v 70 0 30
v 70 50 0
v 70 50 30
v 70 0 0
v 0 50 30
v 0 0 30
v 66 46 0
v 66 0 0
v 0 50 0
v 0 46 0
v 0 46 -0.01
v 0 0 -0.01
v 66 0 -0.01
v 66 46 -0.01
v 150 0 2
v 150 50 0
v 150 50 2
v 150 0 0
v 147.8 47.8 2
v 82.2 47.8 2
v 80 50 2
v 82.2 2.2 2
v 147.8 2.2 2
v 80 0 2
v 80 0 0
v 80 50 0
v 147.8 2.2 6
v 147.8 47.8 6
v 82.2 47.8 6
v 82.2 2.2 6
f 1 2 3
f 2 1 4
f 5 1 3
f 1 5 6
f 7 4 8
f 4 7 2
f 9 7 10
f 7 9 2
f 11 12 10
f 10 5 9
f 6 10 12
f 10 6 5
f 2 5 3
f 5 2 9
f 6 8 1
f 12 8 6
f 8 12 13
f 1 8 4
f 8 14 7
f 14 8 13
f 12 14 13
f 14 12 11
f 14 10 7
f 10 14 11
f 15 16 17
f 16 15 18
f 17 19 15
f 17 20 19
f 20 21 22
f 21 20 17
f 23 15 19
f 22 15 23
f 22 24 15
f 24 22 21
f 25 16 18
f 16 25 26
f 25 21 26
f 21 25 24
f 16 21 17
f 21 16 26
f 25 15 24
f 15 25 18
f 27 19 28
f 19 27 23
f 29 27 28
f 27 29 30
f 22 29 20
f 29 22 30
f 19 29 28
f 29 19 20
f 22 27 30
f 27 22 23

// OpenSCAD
// --- Dimensions ---
// Box outer dimensions
BOX_W = 70;
BOX_D = 50;
BOX_H = 30;

// Box wall and floor thickness
WALL_THK = 2;
FLOOR_THK = 2;

// Lid plate dimensions (matches box outer footprint)
LID_W = 70;
LID_D = 50;
LID_PLATE_THK = 2;

// Lid lip dimensions (inner sliding part)
LIP_OUT_W = 65.6;
LIP_OUT_D = 45.6;
LIP_THK = 1.5;
LIP_H = 4;

// Spacing between parts
GAP = 10;

// --- Calculated Positions ---
// Box is centred at origin in X/Y
BOX_X = 0;
BOX_Y = 0;

// Lid is on the +X side, with GAP distance between them
// Box right edge is at BOX_W/2. Lid left edge is at BOX_W/2 + GAP.
// Lid centre X = (BOX_W/2 + GAP) + LID_W/2
LID_X = (BOX_W / 2) + GAP + (LID_W / 2);
LID_Y = 0; // Centred in Y

// --- Helper: Box Body ---
// Built on XY plane, builds up in +Z
module build_box() {
    $fn = 64;
    
    // 1. Main outer shell
    // Height includes floor and walls. 
    // We build a solid block of size BOX_W x BOX_D x BOX_H
    // Then subtract the inner cavity.
    union() {
        // Outer shell
        cube([BOX_W, BOX_D, BOX_H], center = false);
        
        // Inner cavity subtraction
        // Cavity starts at floor height (FLOOR_THK)
        // Cavity width/depth is reduced by 2 * WALL_THK
        // Cavity height is BOX_H - FLOOR_THK (open top)
        // We extend the cut slightly past the bottom face (z=0) to ensure clean boolean
        translate([0, 0, -0.01]) {
            cube([
                BOX_W - 2 * WALL_THK,
                BOX_D - 2 * WALL_THK,
                BOX_H - FLOOR_THK + 0.02 // Extend slightly into floor to cut cleanly
            ], center = false);
        }
    }
}

// --- Helper: Lid Body ---
// Printed upside down: Plate lies on bed (z=0), Lip builds up from there.
// The lip is the part that slides into the box.
module build_lid() {
    $fn = 64;
    
    union() {
        // 1. The base plate
        // Lies on the bed, thickness LID_PLATE_THK
        cube([LID_W, LID_D, LID_PLATE_THK], center = false);
        
        // 2. The lip
        // Centred on the plate.
        // Outer dimensions: LIP_OUT_W x LIP_OUT_D
        // Height: LIP_H
        // Thickness: LIP_THK (implied by difference between outer and inner lip dimensions)
        // Since it's a "wall", we model it as a solid block of lip dimensions
        // sitting on the plate.
        translate([
            (LID_W - LIP_OUT_W) / 2,
            (LID_D - LIP_OUT_D) / 2,
            LID_PLATE_THK
        ]) {
            cube([LIP_OUT_W, LIP_OUT_D, LIP_H], center = false);
        }
    }
}

// --- Main Assembly ---
// Place parts side by side
translate([BOX_X, BOX_Y, 0]) {
    build_box();
}

translate([LID_X, LID_Y, 0]) {
    build_lid();
}
